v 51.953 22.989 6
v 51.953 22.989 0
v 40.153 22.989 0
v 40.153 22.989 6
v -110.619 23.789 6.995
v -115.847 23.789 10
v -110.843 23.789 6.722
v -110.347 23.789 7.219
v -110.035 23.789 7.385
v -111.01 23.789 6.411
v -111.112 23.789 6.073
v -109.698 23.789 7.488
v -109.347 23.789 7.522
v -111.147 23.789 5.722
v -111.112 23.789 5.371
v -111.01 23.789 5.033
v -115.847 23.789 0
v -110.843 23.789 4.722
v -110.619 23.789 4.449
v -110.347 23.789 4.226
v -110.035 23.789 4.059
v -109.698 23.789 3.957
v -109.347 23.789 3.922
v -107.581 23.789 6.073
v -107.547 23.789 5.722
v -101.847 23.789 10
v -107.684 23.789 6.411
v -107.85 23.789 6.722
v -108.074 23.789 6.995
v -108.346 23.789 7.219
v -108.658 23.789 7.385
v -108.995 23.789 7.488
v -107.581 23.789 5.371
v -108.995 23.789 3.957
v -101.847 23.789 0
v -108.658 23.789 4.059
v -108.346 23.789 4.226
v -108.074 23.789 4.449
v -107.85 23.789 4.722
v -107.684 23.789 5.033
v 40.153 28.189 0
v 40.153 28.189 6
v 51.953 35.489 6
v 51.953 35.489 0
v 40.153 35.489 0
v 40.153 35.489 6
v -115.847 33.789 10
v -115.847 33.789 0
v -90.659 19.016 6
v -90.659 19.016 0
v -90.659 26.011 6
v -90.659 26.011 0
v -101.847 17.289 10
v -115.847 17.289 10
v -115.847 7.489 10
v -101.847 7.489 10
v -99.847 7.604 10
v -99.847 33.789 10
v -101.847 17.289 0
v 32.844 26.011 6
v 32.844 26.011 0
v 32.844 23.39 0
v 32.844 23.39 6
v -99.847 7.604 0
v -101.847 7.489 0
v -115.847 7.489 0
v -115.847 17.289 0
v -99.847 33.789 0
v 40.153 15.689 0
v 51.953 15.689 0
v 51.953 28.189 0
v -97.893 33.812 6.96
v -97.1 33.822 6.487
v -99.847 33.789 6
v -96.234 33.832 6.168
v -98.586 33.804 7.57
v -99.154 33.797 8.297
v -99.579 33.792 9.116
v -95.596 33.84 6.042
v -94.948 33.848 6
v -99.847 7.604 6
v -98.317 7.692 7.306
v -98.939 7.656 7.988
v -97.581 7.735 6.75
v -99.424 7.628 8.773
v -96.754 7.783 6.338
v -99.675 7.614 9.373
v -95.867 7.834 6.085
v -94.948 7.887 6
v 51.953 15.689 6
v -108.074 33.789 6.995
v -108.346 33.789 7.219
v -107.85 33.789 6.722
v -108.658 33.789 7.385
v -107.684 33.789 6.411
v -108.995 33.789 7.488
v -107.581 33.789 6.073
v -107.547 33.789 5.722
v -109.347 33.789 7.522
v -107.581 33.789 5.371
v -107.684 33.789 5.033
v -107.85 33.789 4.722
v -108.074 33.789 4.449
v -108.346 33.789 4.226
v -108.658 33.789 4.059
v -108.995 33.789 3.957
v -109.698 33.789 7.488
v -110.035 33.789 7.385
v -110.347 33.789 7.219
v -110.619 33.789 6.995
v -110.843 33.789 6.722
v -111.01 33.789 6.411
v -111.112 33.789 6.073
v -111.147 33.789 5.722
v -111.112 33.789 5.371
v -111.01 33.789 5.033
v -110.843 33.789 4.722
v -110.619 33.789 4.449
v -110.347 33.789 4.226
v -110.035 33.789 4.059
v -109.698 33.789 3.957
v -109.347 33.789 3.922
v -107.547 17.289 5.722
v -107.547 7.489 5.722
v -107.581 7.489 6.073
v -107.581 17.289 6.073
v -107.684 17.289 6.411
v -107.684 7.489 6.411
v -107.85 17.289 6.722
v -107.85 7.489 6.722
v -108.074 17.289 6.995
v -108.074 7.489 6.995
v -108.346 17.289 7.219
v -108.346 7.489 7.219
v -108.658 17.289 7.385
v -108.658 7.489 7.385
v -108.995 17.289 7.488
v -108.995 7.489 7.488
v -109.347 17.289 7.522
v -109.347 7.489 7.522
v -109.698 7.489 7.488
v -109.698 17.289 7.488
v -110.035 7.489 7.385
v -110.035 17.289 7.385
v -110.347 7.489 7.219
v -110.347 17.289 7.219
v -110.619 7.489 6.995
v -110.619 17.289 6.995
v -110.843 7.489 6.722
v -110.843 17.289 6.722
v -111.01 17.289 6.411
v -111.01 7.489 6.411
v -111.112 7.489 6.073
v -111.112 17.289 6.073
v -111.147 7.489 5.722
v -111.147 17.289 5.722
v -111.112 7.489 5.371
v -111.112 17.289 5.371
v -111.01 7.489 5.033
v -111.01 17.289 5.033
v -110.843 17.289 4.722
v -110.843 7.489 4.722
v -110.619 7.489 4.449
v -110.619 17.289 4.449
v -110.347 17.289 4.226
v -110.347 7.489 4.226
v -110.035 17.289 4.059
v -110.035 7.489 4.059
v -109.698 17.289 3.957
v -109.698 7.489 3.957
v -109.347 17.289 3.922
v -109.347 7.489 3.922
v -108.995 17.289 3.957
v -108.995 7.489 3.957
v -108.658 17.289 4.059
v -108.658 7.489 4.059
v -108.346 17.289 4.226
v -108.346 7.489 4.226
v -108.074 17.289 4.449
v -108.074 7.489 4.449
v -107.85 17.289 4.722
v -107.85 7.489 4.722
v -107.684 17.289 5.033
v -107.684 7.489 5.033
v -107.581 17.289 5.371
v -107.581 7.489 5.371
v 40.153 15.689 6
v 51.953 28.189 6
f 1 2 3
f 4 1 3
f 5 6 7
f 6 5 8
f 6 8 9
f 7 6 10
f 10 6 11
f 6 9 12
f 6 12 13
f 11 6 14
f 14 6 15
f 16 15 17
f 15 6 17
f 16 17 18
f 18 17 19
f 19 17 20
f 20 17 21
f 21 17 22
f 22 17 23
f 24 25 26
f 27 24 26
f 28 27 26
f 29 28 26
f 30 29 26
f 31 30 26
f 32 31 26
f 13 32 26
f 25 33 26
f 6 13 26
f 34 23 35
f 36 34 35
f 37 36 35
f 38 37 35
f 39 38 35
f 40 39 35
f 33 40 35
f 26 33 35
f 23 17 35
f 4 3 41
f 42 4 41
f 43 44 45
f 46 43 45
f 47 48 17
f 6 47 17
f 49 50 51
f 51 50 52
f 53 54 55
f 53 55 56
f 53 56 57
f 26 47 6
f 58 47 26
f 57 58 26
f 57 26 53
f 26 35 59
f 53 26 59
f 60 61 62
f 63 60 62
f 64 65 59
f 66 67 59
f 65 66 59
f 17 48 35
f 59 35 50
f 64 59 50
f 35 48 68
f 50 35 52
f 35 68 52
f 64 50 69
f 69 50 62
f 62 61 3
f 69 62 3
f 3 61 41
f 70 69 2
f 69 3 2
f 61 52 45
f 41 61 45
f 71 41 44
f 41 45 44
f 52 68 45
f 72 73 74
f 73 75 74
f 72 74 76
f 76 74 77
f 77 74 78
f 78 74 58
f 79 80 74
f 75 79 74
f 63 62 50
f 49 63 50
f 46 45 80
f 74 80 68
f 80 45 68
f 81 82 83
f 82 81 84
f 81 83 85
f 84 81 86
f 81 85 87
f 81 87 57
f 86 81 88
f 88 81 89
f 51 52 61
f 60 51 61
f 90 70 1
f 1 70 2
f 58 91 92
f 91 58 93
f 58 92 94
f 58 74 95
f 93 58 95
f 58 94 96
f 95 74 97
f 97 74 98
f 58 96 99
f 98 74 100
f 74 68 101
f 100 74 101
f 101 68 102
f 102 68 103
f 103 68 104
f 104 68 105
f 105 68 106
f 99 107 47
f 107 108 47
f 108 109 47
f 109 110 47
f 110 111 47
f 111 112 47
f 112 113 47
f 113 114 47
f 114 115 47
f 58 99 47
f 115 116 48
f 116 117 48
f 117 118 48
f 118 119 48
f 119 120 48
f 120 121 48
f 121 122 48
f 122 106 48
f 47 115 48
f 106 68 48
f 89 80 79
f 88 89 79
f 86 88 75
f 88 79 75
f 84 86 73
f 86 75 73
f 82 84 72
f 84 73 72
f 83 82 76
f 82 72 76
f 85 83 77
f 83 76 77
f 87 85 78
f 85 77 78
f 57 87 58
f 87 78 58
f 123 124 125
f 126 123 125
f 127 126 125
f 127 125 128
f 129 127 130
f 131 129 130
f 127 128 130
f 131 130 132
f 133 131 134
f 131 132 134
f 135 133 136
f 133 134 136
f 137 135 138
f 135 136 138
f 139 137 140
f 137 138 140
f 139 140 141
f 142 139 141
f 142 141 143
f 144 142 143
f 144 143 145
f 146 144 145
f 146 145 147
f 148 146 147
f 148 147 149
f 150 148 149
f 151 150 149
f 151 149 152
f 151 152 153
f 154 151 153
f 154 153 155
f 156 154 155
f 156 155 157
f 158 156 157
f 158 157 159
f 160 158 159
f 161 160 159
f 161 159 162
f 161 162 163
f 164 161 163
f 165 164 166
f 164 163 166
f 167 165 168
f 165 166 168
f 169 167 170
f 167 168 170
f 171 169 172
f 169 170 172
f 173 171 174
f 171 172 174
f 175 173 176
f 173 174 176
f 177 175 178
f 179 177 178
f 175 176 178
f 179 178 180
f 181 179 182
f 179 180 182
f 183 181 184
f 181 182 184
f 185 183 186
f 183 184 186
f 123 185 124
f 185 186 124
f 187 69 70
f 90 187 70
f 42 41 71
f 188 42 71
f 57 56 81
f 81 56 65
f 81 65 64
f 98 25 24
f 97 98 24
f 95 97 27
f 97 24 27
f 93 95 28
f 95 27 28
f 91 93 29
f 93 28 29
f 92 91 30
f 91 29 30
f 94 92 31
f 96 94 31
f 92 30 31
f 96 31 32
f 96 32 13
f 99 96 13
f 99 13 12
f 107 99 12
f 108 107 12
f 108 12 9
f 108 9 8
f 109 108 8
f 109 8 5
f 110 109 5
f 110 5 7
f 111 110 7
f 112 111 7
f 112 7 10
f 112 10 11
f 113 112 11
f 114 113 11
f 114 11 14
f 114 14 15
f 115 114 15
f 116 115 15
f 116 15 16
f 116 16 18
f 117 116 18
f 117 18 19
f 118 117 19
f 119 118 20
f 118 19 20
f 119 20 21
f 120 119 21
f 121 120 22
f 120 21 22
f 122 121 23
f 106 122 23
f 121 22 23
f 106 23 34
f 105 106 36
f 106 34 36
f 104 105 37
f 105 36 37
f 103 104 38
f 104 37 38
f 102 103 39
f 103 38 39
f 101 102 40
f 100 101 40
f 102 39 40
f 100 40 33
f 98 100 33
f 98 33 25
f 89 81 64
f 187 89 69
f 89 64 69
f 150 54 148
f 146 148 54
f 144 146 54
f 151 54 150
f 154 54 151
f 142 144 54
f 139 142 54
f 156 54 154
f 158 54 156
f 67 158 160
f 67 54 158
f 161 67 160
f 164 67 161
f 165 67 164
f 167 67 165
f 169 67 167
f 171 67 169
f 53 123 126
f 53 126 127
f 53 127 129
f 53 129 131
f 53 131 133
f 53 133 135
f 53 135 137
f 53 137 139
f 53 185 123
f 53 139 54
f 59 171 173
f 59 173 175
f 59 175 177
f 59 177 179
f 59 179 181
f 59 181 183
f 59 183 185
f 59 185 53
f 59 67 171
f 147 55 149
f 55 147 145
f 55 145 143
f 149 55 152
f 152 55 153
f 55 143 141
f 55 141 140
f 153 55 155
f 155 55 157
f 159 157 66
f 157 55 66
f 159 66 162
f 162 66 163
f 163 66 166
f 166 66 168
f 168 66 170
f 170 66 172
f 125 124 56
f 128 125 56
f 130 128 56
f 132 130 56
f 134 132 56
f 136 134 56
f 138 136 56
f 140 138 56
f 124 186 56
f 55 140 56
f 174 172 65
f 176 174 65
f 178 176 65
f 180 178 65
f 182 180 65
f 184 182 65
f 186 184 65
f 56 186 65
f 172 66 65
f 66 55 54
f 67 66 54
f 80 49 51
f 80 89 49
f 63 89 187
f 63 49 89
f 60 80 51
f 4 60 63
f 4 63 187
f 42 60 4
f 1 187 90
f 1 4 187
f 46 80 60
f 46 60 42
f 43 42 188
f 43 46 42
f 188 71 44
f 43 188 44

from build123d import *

# Parameters (mm, degrees)
F0_W        = 5.8
F0_H        = 7.3
F0_W_2      = 14
F0_H_2      = 9.8
F0_W_3      = 6
F1_DEPTH    = 6
F2_DEPTH    = 10
F3_R        = 1.8
F4_DEPTH    = 46
F5_T4_DEPTH = 50.6794044701


# Not quite as in the source:
# - a fillet or chamfer that OpenCascade refuses, or shapes differently, is made with other operations: its cross-section is extruded or revolved along the edge and cut away or added


with BuildPart() as f1:
    # F0 (on Top) → F1 (new body)
    with BuildSketch(Plane.XY):
        with Locations((49.0534804702, 31.8385251075)):
            Rectangle(F0_W, F0_H)
        with Locations((49.0534804702, 19.3385251075)):
            Rectangle(F0_W, F0_H)
        with Locations((-108.8465195298, 12.3885251075)):
            Rectangle(F0_W_2, F0_H_2)
        with Locations((43.1534804702, 31.8385251075)):
            Rectangle(F0_W_3, F0_H)
        with Locations((43.1534804702, 19.3385251075)):
            Rectangle(F0_W_3, F0_H)
        Polygon((-99.8465195298, 7.6040180652), (-99.8465195298, 33.7885251075), (-115.8465195298, 33.7885251075), (-115.8465195298, 31.2885251075), (-115.8465195298, 23.7885251075), (-101.8465195298, 23.7885251075), (-101.8465195298, 17.2885251075), (-101.8465195298, 7.4885251075), align=None)
        Polygon((40.1534804702, 28.1885251075), (40.1534804702, 35.4885251075), (-99.8465195298, 33.7885251075), (-99.8465195298, 7.6040180652), (40.1534804702, 15.6885251075), (40.1534804702, 22.9885251075), align=None)
        Polygon((-90.6591936946, 19.0157179874), (-90.6591936946, 26.0108020157), (32.8437909484, 26.0108020157), (32.8437909484, 23.3903356981), align=None, mode=Mode.SUBTRACT)
    extrude(amount=F1_DEPTH)

    # F0 (on Top) → F2 (join)
    with BuildSketch(Plane.XY):
        Polygon((-99.8465195298, 7.6040180652), (-99.8465195298, 33.7885251075), (-115.8465195298, 33.7885251075), (-115.8465195298, 31.2885251075), (-115.8465195298, 23.7885251075), (-101.8465195298, 23.7885251075), (-101.8465195298, 17.2885251075), (-101.8465195298, 7.4885251075), align=None)
        with Locations((-108.8465195298, 12.3885251075)):
            Rectangle(F0_W_2, F0_H_2)
    extrude(amount=F2_DEPTH)

    # F3 (on Front) → F4 (cut)
    with BuildSketch(Plane.XZ):
        with Locations((-109.3465195298, 5.7222666219)):
            Circle(F3_R)
    extrude(amount=-F4_DEPTH, mode=Mode.SUBTRACT)

    # F5: fillet of radius 5 on 1 edges, made by hand


with BuildPart() as f5_tool2:
    # F5_s3 → F5_t4 (new body)
    with BuildSketch(Plane.XZ.offset(-46.0359738214)):
        with BuildLine():
            ThreePointArc((-94.9475400442, 6), (-98.1098177044, 7.1270166538), (-99.8465195298, 10))
            Line((-99.8465195298, 10), (-99.8465195298, 6))
            Line((-99.8465195298, 6), (-94.9475400442, 6))
        make_face()
    extrude(amount=F5_T4_DEPTH)

    split(bisect_by=Plane(origin=(-0.4249488426, 34.9957870373, 0), x_dir=(0, 0, 1), z_dir=(0.012141962, -0.9999262837, 0)), keep=Keep.TOP)

    split(bisect_by=Plane(origin=(-0.7694930518, 13.3253674816, 0), x_dir=(0, 0, 1), z_dir=(-0.0576504367, 0.9983368305, 0)), keep=Keep.TOP)


with BuildPart() as f1_1:
    add(f1.part)

    # F5_t1: union F5_tool2
    add(f5_tool2.part)


solid = f1_1.part
